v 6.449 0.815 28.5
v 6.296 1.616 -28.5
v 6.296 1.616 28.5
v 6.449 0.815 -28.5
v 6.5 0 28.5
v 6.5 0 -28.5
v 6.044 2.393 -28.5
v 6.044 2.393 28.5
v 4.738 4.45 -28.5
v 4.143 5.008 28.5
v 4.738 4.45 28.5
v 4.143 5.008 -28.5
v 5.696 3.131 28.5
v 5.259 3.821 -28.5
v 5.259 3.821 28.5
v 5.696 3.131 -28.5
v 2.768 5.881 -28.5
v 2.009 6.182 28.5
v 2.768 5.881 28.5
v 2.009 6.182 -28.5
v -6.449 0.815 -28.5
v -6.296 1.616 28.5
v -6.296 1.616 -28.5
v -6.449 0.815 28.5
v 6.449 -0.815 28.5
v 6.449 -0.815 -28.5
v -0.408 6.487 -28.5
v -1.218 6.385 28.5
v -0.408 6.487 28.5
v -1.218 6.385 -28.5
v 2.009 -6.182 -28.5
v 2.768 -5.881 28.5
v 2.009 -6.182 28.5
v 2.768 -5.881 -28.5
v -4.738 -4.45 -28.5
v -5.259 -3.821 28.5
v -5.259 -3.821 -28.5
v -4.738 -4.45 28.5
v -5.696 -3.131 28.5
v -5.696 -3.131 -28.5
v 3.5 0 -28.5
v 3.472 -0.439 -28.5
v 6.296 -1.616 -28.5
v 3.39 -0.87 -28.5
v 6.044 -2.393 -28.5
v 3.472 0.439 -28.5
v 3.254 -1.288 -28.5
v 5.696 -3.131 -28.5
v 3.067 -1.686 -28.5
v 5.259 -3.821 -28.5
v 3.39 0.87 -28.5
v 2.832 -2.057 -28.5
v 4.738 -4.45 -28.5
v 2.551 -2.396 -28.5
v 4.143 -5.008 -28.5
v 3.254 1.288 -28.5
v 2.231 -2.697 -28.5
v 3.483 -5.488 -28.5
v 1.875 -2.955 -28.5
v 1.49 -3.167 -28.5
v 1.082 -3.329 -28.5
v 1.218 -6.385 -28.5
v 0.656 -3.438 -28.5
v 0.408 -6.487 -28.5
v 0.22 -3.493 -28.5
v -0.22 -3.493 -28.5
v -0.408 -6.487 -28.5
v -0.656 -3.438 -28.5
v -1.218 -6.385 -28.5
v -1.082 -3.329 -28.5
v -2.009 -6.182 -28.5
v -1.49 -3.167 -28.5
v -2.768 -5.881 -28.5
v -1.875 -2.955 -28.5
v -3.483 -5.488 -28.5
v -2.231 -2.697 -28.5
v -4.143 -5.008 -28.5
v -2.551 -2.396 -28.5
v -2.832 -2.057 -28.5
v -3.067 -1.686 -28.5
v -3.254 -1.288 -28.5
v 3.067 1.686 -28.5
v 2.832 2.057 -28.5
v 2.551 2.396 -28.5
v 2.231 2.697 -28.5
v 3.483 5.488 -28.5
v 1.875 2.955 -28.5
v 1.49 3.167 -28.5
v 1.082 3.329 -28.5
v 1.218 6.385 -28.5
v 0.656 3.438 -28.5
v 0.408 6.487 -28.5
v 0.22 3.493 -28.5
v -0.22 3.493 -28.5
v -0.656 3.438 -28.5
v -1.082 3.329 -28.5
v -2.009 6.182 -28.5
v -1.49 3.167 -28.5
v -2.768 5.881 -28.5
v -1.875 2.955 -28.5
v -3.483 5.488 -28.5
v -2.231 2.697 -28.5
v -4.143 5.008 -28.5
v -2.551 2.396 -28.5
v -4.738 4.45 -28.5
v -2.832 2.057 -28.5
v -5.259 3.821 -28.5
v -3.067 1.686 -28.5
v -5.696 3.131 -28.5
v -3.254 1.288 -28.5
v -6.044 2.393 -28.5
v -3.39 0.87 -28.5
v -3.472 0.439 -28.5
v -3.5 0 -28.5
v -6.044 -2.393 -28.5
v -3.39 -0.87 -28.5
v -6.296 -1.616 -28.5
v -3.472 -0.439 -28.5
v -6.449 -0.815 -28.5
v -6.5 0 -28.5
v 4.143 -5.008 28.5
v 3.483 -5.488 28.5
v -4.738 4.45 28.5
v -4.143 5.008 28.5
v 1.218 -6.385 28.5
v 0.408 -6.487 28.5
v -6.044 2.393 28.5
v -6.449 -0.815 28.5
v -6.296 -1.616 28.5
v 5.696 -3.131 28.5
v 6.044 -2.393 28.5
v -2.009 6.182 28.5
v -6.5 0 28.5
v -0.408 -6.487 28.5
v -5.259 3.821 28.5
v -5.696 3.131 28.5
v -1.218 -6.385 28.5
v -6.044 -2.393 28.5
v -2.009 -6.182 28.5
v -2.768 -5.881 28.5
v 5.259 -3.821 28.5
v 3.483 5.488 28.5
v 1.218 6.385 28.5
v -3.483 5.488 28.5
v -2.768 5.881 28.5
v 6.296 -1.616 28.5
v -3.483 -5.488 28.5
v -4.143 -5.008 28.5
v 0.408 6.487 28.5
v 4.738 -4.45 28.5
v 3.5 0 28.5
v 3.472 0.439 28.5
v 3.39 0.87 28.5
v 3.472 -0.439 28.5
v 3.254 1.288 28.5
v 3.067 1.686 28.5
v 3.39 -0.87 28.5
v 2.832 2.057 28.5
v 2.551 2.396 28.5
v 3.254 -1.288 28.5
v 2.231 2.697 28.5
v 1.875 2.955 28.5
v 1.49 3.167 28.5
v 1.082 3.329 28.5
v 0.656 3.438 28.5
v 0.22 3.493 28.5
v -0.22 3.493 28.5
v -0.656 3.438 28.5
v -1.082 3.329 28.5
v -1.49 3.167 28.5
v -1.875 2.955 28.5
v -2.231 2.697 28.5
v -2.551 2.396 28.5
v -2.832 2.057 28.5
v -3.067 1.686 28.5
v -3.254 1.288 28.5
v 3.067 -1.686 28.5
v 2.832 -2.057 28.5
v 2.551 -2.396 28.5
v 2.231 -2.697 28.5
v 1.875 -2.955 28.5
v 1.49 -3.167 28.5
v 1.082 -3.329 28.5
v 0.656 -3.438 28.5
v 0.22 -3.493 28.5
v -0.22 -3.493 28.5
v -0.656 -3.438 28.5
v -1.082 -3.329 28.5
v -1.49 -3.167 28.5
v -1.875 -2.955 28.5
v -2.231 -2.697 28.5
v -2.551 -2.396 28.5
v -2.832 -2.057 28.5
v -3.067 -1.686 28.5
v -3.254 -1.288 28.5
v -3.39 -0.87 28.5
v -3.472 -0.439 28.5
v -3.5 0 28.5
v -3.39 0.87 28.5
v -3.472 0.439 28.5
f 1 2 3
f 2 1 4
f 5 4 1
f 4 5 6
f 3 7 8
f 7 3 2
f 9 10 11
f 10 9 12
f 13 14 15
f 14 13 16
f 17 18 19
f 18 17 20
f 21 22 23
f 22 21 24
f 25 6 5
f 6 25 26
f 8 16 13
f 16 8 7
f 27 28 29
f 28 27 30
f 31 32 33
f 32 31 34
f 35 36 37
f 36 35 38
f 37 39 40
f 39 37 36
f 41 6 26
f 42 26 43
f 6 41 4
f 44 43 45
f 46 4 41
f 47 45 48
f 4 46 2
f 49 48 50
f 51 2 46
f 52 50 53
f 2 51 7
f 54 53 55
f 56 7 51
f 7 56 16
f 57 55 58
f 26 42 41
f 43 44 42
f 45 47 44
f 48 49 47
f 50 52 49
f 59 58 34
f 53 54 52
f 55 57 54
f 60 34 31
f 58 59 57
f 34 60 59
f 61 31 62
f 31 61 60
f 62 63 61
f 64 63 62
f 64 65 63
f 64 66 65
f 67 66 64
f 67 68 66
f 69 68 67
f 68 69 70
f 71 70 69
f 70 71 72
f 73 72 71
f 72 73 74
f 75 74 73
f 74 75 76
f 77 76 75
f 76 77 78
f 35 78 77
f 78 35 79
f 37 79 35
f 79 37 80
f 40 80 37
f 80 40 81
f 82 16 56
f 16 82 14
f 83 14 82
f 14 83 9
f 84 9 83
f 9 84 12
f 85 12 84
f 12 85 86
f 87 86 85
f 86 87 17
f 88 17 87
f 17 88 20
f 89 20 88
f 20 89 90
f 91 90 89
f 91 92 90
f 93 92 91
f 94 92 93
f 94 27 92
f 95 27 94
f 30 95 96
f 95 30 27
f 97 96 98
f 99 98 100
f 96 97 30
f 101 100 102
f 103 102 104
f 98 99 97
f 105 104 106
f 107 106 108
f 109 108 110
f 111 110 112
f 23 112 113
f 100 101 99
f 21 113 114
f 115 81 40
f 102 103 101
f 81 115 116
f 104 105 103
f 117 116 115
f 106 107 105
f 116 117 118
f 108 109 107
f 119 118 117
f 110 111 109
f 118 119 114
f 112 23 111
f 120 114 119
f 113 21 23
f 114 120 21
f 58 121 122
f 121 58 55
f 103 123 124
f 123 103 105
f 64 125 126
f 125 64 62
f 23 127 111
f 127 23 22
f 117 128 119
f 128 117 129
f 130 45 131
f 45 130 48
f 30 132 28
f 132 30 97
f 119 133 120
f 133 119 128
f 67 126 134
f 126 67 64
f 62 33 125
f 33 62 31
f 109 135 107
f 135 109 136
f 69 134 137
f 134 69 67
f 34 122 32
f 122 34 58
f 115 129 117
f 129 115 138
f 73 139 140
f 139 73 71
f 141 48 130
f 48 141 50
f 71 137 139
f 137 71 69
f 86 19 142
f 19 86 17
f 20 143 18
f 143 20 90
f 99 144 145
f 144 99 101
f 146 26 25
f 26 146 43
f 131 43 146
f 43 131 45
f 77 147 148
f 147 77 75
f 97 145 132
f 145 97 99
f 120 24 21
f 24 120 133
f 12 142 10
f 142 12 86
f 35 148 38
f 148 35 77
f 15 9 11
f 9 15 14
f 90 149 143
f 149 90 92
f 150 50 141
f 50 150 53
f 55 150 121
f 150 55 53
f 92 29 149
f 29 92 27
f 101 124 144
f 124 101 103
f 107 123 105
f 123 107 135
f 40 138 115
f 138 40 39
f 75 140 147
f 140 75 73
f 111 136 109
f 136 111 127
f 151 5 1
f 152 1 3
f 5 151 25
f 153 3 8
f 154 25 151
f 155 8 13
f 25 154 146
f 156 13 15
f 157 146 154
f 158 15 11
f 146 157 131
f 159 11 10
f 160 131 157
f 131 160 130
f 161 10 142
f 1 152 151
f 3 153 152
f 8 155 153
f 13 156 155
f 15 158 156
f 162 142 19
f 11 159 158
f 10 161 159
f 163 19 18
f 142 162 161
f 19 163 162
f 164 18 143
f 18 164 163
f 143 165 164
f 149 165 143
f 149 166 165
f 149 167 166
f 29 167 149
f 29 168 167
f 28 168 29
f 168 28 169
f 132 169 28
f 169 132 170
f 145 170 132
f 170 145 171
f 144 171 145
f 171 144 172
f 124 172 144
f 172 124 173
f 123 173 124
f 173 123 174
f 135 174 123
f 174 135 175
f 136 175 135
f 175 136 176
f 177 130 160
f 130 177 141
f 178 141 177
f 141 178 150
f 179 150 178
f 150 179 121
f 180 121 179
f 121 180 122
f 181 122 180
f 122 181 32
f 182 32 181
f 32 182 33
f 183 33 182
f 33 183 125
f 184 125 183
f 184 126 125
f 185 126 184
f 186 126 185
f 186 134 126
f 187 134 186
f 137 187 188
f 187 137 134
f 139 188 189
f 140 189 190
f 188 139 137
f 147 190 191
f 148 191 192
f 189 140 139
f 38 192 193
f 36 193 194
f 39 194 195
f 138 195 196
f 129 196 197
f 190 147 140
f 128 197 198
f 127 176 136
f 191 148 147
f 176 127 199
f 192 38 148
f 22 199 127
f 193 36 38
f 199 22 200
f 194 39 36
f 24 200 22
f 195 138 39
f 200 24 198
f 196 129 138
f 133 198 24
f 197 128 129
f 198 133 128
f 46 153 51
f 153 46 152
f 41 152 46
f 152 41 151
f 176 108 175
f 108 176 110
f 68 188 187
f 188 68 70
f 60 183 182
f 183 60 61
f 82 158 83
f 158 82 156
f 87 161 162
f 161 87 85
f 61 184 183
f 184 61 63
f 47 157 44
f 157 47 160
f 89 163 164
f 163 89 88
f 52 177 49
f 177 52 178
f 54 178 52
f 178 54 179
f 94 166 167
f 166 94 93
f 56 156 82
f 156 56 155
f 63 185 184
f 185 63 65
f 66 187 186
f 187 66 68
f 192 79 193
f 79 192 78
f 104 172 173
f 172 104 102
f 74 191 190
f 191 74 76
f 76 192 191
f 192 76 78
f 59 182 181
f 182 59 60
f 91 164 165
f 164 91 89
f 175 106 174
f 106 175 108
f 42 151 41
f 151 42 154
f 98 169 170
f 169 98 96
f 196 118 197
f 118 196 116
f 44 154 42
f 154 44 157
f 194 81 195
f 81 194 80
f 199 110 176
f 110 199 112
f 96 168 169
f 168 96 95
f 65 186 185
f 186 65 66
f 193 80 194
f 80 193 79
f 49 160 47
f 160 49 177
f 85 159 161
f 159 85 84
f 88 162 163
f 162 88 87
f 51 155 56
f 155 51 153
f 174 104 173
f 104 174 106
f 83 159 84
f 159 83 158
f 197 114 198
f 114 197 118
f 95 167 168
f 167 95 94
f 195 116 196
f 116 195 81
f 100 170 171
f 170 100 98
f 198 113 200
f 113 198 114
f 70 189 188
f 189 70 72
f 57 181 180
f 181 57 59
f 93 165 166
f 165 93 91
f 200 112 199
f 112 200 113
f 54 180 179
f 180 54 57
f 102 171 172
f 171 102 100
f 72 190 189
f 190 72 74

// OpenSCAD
$fn = 50;


difference() {
	union() {
		translate(v = [0, 0, -28.5000000000]) {
			cylinder(h = 57, r = 6.5000000000);
		}
	}
	union() {
		translate(v = [0, 0, -100.0000000000]) {
			cylinder(h = 200, r = 3.5000000000);
		}
	}
}
